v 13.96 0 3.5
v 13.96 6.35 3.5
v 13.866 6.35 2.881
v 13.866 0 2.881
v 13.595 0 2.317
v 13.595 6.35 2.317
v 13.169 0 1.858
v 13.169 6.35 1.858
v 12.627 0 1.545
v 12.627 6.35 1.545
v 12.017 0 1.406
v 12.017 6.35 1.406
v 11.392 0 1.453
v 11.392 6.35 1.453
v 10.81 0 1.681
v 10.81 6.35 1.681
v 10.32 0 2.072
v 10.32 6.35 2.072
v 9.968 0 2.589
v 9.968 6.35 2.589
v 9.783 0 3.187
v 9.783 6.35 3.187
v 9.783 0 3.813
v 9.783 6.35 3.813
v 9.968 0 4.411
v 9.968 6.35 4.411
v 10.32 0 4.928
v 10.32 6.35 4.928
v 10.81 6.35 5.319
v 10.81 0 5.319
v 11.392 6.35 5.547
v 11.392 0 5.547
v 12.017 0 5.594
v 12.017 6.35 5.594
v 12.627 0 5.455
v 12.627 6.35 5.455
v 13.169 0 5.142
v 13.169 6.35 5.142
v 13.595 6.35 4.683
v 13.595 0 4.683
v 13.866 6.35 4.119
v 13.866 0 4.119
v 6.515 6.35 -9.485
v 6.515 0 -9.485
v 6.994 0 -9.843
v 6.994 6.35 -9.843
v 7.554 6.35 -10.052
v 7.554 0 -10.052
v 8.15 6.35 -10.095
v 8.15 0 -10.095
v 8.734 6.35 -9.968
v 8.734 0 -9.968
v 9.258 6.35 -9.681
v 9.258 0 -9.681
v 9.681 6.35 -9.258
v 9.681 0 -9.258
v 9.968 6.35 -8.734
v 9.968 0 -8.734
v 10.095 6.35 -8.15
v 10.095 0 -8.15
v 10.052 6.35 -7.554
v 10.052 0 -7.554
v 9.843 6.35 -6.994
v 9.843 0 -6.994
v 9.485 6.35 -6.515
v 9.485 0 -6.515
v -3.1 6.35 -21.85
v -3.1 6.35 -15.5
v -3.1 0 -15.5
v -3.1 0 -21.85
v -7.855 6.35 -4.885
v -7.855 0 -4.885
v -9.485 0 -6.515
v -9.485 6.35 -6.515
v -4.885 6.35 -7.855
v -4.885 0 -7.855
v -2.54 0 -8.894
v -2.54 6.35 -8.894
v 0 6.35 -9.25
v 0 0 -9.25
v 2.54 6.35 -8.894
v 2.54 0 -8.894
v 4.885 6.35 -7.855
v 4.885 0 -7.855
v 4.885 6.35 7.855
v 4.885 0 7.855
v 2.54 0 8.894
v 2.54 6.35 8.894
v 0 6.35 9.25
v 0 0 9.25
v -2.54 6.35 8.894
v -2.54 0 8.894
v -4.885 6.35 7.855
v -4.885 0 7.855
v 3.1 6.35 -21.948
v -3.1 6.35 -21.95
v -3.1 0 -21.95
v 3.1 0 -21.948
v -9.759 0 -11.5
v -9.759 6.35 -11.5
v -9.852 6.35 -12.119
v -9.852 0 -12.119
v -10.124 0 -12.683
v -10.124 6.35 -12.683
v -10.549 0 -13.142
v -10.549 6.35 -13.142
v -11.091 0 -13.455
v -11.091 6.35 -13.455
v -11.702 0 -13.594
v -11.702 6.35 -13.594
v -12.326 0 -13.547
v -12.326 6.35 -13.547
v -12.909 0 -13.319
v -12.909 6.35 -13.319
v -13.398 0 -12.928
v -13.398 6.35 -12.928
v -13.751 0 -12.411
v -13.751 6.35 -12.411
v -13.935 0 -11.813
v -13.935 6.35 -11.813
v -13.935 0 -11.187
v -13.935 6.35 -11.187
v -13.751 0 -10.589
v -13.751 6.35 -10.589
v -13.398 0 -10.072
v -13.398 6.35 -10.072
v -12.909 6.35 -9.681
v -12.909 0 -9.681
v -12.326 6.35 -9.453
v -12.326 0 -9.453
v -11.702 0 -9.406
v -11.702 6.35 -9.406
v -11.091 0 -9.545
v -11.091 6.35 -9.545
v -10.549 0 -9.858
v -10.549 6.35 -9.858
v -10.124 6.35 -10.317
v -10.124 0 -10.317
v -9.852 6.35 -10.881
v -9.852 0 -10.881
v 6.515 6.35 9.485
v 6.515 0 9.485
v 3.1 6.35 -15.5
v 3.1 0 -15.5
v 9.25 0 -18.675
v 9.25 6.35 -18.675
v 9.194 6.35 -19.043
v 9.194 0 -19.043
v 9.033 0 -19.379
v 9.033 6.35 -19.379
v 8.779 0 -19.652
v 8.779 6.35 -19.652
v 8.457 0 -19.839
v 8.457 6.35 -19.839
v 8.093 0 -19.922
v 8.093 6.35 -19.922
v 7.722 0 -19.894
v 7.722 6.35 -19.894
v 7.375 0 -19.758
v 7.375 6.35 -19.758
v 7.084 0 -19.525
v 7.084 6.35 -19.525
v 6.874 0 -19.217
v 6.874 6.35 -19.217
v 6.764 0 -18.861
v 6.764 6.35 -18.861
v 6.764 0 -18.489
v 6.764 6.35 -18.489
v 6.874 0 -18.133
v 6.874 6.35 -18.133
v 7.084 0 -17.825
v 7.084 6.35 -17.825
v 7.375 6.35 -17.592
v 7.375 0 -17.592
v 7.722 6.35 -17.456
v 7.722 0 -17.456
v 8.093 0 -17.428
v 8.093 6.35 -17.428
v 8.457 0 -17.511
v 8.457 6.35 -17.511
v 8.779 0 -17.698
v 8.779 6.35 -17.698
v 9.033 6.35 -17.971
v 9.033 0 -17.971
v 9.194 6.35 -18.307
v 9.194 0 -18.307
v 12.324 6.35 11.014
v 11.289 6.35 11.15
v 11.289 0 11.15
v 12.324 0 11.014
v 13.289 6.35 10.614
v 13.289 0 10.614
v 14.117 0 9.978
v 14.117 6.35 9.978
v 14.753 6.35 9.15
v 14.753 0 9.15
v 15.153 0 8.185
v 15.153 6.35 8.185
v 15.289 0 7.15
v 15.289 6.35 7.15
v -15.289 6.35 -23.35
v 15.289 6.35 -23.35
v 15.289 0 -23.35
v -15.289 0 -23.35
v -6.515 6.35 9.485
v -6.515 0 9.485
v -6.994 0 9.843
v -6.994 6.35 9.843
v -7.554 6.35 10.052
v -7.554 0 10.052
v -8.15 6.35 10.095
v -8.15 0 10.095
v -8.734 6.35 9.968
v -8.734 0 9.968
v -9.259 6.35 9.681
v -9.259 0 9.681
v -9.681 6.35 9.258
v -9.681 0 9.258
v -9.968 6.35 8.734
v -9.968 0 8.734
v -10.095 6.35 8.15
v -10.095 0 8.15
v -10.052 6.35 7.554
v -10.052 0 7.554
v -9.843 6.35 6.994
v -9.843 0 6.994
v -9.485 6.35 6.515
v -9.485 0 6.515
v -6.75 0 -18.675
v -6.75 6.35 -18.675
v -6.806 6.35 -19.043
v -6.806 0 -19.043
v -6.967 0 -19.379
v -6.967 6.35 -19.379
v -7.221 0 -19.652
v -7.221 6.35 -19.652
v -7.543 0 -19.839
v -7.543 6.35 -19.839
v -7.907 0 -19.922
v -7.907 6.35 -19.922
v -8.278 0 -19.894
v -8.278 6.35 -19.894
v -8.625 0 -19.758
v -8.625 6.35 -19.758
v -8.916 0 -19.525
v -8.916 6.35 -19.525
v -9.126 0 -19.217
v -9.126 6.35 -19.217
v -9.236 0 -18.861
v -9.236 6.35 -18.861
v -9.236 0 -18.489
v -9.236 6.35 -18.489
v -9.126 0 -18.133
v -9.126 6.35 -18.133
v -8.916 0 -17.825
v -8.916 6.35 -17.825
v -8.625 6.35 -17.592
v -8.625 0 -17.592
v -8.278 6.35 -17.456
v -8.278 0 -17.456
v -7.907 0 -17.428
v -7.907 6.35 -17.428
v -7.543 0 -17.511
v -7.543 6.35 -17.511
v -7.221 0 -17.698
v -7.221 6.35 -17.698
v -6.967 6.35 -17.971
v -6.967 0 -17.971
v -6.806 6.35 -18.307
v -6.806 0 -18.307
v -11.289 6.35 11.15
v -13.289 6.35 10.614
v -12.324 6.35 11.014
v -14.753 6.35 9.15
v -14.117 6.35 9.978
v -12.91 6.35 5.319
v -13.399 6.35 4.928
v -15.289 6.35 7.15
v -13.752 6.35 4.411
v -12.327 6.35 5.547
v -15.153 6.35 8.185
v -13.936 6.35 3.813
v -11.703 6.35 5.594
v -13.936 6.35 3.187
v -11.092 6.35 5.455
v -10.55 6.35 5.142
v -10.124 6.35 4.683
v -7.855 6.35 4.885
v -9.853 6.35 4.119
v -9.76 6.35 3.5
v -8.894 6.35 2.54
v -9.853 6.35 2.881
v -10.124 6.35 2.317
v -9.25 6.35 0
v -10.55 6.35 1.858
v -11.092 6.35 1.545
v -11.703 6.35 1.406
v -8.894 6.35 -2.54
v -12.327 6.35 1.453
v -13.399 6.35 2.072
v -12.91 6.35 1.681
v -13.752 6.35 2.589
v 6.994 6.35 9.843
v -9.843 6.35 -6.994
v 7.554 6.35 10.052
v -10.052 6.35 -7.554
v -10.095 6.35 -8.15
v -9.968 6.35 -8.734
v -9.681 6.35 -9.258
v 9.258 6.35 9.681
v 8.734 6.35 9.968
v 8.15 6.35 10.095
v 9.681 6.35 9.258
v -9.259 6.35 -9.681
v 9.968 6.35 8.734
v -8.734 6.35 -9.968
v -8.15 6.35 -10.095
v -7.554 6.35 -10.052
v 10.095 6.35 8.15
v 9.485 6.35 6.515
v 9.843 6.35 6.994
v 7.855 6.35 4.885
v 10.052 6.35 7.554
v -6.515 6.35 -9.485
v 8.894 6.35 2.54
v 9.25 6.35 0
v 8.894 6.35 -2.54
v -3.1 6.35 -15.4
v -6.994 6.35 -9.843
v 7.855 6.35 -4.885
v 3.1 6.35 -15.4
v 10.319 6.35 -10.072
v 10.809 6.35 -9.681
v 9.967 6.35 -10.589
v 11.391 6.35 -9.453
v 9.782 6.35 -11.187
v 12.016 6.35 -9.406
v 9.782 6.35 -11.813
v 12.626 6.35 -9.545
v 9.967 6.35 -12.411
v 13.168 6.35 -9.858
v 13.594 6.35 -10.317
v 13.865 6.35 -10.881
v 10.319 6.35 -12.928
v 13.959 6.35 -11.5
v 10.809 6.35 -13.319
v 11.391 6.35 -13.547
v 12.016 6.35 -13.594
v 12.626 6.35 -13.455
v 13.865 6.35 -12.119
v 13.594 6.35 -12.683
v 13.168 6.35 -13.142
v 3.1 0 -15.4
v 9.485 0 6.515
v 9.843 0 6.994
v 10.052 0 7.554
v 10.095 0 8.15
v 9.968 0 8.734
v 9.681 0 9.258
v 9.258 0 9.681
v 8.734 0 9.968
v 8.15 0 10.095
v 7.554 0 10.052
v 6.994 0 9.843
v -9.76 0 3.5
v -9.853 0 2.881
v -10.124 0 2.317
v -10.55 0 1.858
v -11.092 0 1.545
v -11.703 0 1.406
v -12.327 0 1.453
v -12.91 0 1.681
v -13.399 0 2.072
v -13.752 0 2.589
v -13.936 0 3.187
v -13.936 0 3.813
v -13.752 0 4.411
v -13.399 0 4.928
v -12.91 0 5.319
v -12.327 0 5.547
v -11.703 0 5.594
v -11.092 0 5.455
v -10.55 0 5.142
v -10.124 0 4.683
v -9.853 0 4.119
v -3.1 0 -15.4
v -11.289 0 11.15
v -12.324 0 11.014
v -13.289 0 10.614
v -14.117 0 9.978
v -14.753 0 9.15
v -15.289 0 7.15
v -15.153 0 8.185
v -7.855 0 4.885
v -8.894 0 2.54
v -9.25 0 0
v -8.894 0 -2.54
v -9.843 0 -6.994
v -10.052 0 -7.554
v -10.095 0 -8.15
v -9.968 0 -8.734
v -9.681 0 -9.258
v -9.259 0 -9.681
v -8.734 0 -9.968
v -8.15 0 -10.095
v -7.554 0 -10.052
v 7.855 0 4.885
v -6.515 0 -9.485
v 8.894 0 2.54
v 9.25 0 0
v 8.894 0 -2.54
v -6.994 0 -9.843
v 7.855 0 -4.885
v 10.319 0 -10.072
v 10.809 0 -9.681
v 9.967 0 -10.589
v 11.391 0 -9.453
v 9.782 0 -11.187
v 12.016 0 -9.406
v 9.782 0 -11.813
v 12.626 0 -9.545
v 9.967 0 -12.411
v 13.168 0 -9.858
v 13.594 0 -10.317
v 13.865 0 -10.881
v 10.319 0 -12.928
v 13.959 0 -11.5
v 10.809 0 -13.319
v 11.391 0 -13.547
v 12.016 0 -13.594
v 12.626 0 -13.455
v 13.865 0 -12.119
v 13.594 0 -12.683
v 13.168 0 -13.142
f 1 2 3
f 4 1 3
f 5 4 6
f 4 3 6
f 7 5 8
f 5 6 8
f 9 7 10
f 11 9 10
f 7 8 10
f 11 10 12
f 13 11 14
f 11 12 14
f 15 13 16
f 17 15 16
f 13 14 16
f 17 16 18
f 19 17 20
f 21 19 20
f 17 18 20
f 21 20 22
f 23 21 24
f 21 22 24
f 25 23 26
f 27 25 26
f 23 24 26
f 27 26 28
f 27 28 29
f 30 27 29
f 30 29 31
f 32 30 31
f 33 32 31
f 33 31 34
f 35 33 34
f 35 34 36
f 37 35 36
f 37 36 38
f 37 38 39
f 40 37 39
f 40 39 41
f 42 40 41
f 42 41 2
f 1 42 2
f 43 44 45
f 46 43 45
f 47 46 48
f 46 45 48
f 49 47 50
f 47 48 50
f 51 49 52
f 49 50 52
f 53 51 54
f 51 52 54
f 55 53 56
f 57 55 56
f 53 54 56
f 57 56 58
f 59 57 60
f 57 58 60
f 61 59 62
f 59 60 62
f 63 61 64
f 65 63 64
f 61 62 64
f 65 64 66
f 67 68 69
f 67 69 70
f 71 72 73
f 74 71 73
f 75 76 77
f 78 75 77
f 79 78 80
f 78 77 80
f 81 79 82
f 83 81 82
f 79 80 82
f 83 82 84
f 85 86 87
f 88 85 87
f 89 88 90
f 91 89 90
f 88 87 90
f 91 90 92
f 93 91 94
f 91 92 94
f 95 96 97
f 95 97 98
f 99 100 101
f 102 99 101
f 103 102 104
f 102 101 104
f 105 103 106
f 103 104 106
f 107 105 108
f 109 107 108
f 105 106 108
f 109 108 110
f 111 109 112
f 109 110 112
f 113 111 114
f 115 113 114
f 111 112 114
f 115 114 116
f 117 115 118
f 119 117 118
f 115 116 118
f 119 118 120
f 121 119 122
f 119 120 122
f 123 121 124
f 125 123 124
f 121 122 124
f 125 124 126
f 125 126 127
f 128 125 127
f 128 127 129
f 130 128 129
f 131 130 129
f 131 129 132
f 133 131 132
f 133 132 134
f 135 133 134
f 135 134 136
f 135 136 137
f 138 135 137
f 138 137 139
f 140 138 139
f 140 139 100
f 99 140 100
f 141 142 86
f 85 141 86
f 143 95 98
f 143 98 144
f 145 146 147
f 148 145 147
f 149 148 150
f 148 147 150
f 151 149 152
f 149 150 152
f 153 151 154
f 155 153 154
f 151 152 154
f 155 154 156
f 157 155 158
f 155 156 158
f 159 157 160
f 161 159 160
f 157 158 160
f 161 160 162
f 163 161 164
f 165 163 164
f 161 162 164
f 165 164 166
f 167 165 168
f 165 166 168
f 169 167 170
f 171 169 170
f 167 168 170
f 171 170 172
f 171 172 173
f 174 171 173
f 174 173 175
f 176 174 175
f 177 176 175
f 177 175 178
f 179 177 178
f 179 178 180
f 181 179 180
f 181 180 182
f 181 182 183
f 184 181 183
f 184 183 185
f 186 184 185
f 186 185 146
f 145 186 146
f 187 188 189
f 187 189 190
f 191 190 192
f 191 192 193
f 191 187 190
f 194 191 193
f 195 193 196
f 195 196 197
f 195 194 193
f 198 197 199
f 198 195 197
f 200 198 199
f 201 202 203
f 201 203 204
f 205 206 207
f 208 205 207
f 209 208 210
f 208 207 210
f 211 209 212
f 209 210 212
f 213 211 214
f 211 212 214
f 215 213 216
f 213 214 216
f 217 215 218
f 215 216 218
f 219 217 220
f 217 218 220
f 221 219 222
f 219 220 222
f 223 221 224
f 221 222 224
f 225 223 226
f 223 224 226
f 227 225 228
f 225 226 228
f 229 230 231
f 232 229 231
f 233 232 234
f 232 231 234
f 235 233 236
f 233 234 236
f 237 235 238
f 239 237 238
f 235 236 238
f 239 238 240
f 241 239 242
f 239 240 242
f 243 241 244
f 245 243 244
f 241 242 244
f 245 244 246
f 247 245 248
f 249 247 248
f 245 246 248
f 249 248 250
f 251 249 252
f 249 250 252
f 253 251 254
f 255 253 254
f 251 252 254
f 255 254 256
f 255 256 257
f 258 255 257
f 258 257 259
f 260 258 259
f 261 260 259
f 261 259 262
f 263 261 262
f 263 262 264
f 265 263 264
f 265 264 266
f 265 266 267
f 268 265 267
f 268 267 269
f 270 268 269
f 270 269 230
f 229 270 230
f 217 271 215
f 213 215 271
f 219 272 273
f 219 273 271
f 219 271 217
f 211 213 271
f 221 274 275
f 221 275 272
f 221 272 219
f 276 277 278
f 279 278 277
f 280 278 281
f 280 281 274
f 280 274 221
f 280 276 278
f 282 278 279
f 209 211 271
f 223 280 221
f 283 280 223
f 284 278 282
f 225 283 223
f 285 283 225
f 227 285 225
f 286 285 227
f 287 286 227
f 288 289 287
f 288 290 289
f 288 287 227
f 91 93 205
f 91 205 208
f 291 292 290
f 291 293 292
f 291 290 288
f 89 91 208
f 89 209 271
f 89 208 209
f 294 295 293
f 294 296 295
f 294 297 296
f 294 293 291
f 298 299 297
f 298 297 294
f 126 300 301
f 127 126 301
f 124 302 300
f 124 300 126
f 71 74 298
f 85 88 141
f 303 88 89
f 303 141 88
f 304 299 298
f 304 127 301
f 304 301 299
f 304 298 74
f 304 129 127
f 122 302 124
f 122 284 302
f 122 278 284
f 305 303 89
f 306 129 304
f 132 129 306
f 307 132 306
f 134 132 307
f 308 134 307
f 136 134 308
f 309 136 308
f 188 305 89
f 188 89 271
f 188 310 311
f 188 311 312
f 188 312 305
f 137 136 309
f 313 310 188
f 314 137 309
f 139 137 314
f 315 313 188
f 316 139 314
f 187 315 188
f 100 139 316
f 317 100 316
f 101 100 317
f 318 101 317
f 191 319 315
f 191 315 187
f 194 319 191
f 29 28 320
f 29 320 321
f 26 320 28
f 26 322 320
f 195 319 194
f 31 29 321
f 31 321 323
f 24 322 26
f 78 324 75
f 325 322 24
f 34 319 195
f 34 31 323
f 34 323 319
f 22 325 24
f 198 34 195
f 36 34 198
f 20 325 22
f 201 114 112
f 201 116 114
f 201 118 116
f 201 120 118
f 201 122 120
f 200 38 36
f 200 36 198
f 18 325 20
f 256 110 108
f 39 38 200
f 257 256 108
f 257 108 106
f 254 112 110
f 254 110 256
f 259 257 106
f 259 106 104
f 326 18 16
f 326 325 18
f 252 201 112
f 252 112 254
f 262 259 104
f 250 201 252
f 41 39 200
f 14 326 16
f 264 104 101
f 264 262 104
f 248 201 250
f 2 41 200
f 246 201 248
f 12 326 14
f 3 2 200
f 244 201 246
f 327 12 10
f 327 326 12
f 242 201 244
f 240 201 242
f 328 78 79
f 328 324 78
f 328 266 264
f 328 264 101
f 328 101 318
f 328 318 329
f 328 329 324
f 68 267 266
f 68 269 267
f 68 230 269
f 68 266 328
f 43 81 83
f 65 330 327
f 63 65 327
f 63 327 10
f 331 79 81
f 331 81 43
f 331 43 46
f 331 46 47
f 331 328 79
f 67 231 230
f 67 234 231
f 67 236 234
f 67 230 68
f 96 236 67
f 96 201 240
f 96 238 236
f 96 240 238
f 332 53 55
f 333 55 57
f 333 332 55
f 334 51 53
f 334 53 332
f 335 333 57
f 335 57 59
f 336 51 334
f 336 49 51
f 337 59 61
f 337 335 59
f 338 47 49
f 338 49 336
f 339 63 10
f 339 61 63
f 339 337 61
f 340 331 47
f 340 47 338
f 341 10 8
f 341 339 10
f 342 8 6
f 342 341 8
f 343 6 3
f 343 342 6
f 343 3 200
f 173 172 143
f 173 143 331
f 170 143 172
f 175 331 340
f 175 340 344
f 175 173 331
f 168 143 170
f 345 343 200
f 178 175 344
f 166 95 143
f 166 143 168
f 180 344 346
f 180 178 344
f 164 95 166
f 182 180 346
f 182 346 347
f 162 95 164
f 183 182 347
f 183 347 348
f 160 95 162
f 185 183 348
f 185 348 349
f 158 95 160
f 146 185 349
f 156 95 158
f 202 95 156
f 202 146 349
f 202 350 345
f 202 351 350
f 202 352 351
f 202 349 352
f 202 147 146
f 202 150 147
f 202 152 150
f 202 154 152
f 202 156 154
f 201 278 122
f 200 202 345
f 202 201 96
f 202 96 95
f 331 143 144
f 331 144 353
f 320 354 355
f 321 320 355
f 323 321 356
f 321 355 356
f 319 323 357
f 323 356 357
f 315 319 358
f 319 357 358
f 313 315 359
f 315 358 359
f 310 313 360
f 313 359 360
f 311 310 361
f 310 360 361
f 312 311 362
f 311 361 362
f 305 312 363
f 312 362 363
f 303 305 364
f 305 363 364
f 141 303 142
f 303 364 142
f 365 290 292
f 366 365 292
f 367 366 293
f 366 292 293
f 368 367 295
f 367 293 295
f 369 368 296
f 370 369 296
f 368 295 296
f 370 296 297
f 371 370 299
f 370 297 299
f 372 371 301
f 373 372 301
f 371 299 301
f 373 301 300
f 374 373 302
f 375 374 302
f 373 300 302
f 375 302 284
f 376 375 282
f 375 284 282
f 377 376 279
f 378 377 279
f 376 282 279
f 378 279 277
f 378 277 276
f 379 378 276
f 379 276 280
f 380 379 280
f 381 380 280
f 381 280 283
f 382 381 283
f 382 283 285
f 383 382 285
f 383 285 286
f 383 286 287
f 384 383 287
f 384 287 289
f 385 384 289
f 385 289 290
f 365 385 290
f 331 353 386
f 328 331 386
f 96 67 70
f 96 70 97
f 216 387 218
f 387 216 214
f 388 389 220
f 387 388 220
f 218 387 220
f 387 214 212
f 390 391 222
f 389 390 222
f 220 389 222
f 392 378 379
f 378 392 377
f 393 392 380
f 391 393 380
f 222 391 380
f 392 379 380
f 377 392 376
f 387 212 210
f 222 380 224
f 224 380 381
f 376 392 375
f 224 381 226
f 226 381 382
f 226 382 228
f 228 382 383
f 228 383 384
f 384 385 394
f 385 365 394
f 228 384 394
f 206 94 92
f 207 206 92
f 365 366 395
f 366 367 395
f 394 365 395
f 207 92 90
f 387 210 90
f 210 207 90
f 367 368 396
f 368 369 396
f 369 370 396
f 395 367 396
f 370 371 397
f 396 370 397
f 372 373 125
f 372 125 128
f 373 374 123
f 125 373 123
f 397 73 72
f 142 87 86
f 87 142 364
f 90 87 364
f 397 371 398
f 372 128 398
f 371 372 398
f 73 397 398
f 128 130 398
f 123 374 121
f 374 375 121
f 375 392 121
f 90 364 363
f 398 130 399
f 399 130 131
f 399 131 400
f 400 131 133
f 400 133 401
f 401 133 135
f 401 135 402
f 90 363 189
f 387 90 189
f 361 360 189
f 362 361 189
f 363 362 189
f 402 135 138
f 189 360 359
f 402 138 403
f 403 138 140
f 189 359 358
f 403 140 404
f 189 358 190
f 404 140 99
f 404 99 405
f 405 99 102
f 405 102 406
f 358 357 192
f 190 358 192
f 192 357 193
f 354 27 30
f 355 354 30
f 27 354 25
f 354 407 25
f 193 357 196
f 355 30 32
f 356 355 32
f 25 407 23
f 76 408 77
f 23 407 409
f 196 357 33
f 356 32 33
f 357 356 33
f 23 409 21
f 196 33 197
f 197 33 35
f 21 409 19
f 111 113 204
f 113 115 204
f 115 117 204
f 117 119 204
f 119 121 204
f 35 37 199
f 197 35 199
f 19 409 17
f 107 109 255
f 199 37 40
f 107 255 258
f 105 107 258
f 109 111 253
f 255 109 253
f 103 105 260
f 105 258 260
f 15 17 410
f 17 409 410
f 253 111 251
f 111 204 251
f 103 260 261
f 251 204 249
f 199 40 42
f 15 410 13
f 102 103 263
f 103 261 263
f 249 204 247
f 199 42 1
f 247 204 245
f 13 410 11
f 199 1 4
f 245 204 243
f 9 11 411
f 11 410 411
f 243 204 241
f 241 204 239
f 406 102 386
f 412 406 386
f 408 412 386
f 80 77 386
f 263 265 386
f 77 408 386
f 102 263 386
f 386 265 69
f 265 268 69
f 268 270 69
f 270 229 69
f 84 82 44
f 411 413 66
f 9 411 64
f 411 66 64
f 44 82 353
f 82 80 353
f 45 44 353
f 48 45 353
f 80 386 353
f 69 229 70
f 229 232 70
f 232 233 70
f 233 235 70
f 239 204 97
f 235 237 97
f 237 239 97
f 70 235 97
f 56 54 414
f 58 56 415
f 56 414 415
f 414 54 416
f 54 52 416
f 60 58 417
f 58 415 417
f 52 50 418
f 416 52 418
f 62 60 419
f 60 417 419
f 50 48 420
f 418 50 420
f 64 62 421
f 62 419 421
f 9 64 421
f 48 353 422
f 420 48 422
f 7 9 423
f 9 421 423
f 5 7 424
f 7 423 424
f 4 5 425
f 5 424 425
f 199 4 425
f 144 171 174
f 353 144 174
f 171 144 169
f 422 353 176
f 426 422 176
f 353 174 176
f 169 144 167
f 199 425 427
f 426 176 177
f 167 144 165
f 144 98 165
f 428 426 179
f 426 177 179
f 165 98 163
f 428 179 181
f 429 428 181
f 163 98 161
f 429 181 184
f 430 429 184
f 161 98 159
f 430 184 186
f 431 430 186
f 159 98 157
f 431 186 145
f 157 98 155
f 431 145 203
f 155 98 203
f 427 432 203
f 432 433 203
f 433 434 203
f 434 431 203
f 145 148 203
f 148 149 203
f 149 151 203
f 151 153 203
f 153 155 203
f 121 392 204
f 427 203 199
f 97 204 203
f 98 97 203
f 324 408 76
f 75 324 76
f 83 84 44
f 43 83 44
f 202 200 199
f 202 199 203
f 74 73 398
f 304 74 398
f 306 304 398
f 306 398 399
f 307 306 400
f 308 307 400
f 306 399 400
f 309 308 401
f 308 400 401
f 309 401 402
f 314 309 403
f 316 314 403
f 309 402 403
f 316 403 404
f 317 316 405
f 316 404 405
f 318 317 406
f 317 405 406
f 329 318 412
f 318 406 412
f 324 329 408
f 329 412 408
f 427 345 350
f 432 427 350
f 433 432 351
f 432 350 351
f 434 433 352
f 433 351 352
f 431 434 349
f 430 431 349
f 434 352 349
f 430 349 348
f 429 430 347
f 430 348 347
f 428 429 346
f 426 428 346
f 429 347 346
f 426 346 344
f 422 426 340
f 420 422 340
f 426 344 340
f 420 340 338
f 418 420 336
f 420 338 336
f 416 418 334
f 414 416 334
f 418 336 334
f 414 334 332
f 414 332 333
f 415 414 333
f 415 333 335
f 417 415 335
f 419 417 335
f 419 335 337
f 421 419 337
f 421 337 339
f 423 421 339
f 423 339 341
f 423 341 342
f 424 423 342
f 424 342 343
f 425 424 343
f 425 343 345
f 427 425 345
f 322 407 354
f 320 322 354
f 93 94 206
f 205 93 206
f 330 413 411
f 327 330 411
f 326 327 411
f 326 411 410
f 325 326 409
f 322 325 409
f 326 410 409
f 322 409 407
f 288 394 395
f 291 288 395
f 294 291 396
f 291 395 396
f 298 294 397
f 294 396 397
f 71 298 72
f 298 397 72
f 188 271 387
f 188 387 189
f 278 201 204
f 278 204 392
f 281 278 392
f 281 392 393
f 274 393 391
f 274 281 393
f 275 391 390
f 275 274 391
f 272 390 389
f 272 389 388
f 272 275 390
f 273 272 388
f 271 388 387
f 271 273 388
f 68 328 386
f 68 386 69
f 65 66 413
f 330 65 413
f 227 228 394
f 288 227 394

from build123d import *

# Parameters (mm, degrees)
BOSS_EXTRUDE1_DEPTH            = 6.35
CUT_EXTRUDE1_DEPTH             = 7.35
F_2_5_2_5_DIAMETER_HOLE1_D     = 2.5
F_2_5_2_5_DIAMETER_HOLE1_DEPTH = 6.35
F_2_5_2_5_DIAMETER_HOLE2_D     = 2.5
F_2_5_2_5_DIAMETER_HOLE2_DEPTH = 6.35
F_4_2_4_2_DIAMETER_HOLE1_D     = 4.2
F_4_2_4_2_DIAMETER_HOLE1_DEPTH = 6.35
F_4_2_4_2_DIAMETER_HOLE2_D     = 4.2
F_4_2_4_2_DIAMETER_HOLE2_DEPTH = 6.35
F_4_2_4_2_DIAMETER_HOLE3_D     = 4.2
F_4_2_4_2_DIAMETER_HOLE3_DEPTH = 6.35
F_4_2_4_2_DIAMETER_HOLE4_D     = 4.2
F_4_2_4_2_DIAMETER_HOLE4_DEPTH = 6.35


with BuildPart() as part:
    # Sketch1 → Boss-Extrude1 (new body)
    with BuildSketch(Plane(origin=(0, 6.35, 0), x_dir=(1, 0, 0), z_dir=(0, 1, 0))):
        with BuildLine():
            Line((-15.289019905, 23.35), (-15.289019905, -7.15))
            ThreePointArc((-15.289019905, -7.15), (-14.11744703, -9.978427125), (-11.289019905, -11.15))
            Line((-11.289019905, -11.15), (11.288980095, -11.15))
            ThreePointArc((11.288980095, -11.15), (14.11740722, -9.978427125), (15.288980095, -7.15))
            Line((15.288980095, -7.15), (15.288980095, 23.35))
            Line((15.288980095, 23.35), (-15.289019905, 23.35))
        make_face()
        Polygon((-3.100095833, 15.4), (-3.100019905, 15.499999999), (-3.100019905, 21.85), (-3.09998206, 21.949999993), (3.099980095, 21.947653655), (3.099980095, 15.500000006), (3.100055965, 15.4), align=None, mode=Mode.SUBTRACT)
    extrude(amount=-BOSS_EXTRUDE1_DEPTH)

    # Sketch2 → Cut-Extrude1 (cut, through all)
    with BuildSketch(Plane.XZ):
        with BuildLine():
            Line((4.885014967, -7.854879297), (6.515054007, -9.484922393))
            ThreePointArc((6.515054007, -9.484922393), (9.484902488, -9.484926088), (9.484906183, -6.515077607))
            Line((9.484906183, -6.515077607), (7.854867143, -4.885034511))
            ThreePointArc((7.854867143, -4.885034511), (9.25, 0), (7.854867143, 4.885034511))
            Line((7.854867143, 4.885034511), (9.484906183, 6.515077607))
            ThreePointArc((9.484906183, 6.515077607), (9.484902486, 9.484926095), (6.515053997, 9.484922394))
            Line((6.515053997, 9.484922394), (4.885014967, 7.854879297))
            ThreePointArc((4.885014967, 7.854879297), (-1.1508e-05, 9.25), (-4.885034511, 7.854867143))
            Line((-4.885034511, 7.854867143), (-6.515097512, 9.484926088))
            ThreePointArc((-6.515097512, 9.484926088), (-9.484946, 9.484922391), (-9.484942299, 6.515073902))
            Line((-9.484942299, 6.515073902), (-7.854879297, 4.885014967))
            ThreePointArc((-7.854879297, 4.885014967), (-9.25, 0), (-7.854879297, -4.885014967))
            Line((-7.854879297, -4.885014967), (-9.484942298, -6.515073912))
            ThreePointArc((-9.484942298, -6.515073912), (-9.484945993, -9.484922393), (-6.515097512, -9.484926088))
            Line((-6.515097512, -9.484926088), (-4.885034511, -7.854867143))
            ThreePointArc((-4.885034511, -7.854867143), (-1.1508e-05, -9.25), (4.885014967, -7.854879297))
        make_face()
    extrude(amount=-CUT_EXTRUDE1_DEPTH, mode=Mode.SUBTRACT)

    # Ø2.5 (2.5) Diameter Hole1
    with Locations(Plane(origin=(0, 0, 0), x_dir=(-1, 0, 0), z_dir=(0, -1, 0))):
        with Locations((8.000019905, 18.675)):
            Hole(F_2_5_2_5_DIAMETER_HOLE1_D / 2, depth=F_2_5_2_5_DIAMETER_HOLE1_DEPTH)

    # Ø2.5 (2.5) Diameter Hole2
    with Locations(Plane(origin=(0, 0, 0), x_dir=(-1, 0, 0), z_dir=(0, -1, 0))):
        with Locations((-7.999980095, 18.675)):
            Hole(F_2_5_2_5_DIAMETER_HOLE2_D / 2, depth=F_2_5_2_5_DIAMETER_HOLE2_DEPTH)

    # Ø4.2 (4.2) Diameter Hole1
    with Locations(Plane(origin=(0, 0, 0), x_dir=(-1, 0, 0), z_dir=(0, -1, 0))):
        with Locations((-11.858647005, 11.5)):
            Hole(F_4_2_4_2_DIAMETER_HOLE1_D / 2, depth=F_4_2_4_2_DIAMETER_HOLE1_DEPTH)

    # Ø4.2 (4.2) Diameter Hole2
    with Locations(Plane(origin=(0, 0, 0), x_dir=(-1, 0, 0), z_dir=(0, -1, 0))):
        with Locations((11.858637076, 11.5)):
            Hole(F_4_2_4_2_DIAMETER_HOLE2_D / 2, depth=F_4_2_4_2_DIAMETER_HOLE2_DEPTH)

    # Ø4.2 (4.2) Diameter Hole3
    with Locations(Plane(origin=(0, 0, 0), x_dir=(-1, 0, 0), z_dir=(0, -1, 0))):
        with Locations((-11.859575542, -3.5)):
            Hole(F_4_2_4_2_DIAMETER_HOLE3_D / 2, depth=F_4_2_4_2_DIAMETER_HOLE3_DEPTH)

    # Ø4.2 (4.2) Diameter Hole4
    with Locations(Plane(origin=(0, 0, 0), x_dir=(-1, 0, 0), z_dir=(0, -1, 0))):
        with Locations((11.85956559, -3.500033723)):
            Hole(F_4_2_4_2_DIAMETER_HOLE4_D / 2, depth=F_4_2_4_2_DIAMETER_HOLE4_DEPTH)


solid = part.part
